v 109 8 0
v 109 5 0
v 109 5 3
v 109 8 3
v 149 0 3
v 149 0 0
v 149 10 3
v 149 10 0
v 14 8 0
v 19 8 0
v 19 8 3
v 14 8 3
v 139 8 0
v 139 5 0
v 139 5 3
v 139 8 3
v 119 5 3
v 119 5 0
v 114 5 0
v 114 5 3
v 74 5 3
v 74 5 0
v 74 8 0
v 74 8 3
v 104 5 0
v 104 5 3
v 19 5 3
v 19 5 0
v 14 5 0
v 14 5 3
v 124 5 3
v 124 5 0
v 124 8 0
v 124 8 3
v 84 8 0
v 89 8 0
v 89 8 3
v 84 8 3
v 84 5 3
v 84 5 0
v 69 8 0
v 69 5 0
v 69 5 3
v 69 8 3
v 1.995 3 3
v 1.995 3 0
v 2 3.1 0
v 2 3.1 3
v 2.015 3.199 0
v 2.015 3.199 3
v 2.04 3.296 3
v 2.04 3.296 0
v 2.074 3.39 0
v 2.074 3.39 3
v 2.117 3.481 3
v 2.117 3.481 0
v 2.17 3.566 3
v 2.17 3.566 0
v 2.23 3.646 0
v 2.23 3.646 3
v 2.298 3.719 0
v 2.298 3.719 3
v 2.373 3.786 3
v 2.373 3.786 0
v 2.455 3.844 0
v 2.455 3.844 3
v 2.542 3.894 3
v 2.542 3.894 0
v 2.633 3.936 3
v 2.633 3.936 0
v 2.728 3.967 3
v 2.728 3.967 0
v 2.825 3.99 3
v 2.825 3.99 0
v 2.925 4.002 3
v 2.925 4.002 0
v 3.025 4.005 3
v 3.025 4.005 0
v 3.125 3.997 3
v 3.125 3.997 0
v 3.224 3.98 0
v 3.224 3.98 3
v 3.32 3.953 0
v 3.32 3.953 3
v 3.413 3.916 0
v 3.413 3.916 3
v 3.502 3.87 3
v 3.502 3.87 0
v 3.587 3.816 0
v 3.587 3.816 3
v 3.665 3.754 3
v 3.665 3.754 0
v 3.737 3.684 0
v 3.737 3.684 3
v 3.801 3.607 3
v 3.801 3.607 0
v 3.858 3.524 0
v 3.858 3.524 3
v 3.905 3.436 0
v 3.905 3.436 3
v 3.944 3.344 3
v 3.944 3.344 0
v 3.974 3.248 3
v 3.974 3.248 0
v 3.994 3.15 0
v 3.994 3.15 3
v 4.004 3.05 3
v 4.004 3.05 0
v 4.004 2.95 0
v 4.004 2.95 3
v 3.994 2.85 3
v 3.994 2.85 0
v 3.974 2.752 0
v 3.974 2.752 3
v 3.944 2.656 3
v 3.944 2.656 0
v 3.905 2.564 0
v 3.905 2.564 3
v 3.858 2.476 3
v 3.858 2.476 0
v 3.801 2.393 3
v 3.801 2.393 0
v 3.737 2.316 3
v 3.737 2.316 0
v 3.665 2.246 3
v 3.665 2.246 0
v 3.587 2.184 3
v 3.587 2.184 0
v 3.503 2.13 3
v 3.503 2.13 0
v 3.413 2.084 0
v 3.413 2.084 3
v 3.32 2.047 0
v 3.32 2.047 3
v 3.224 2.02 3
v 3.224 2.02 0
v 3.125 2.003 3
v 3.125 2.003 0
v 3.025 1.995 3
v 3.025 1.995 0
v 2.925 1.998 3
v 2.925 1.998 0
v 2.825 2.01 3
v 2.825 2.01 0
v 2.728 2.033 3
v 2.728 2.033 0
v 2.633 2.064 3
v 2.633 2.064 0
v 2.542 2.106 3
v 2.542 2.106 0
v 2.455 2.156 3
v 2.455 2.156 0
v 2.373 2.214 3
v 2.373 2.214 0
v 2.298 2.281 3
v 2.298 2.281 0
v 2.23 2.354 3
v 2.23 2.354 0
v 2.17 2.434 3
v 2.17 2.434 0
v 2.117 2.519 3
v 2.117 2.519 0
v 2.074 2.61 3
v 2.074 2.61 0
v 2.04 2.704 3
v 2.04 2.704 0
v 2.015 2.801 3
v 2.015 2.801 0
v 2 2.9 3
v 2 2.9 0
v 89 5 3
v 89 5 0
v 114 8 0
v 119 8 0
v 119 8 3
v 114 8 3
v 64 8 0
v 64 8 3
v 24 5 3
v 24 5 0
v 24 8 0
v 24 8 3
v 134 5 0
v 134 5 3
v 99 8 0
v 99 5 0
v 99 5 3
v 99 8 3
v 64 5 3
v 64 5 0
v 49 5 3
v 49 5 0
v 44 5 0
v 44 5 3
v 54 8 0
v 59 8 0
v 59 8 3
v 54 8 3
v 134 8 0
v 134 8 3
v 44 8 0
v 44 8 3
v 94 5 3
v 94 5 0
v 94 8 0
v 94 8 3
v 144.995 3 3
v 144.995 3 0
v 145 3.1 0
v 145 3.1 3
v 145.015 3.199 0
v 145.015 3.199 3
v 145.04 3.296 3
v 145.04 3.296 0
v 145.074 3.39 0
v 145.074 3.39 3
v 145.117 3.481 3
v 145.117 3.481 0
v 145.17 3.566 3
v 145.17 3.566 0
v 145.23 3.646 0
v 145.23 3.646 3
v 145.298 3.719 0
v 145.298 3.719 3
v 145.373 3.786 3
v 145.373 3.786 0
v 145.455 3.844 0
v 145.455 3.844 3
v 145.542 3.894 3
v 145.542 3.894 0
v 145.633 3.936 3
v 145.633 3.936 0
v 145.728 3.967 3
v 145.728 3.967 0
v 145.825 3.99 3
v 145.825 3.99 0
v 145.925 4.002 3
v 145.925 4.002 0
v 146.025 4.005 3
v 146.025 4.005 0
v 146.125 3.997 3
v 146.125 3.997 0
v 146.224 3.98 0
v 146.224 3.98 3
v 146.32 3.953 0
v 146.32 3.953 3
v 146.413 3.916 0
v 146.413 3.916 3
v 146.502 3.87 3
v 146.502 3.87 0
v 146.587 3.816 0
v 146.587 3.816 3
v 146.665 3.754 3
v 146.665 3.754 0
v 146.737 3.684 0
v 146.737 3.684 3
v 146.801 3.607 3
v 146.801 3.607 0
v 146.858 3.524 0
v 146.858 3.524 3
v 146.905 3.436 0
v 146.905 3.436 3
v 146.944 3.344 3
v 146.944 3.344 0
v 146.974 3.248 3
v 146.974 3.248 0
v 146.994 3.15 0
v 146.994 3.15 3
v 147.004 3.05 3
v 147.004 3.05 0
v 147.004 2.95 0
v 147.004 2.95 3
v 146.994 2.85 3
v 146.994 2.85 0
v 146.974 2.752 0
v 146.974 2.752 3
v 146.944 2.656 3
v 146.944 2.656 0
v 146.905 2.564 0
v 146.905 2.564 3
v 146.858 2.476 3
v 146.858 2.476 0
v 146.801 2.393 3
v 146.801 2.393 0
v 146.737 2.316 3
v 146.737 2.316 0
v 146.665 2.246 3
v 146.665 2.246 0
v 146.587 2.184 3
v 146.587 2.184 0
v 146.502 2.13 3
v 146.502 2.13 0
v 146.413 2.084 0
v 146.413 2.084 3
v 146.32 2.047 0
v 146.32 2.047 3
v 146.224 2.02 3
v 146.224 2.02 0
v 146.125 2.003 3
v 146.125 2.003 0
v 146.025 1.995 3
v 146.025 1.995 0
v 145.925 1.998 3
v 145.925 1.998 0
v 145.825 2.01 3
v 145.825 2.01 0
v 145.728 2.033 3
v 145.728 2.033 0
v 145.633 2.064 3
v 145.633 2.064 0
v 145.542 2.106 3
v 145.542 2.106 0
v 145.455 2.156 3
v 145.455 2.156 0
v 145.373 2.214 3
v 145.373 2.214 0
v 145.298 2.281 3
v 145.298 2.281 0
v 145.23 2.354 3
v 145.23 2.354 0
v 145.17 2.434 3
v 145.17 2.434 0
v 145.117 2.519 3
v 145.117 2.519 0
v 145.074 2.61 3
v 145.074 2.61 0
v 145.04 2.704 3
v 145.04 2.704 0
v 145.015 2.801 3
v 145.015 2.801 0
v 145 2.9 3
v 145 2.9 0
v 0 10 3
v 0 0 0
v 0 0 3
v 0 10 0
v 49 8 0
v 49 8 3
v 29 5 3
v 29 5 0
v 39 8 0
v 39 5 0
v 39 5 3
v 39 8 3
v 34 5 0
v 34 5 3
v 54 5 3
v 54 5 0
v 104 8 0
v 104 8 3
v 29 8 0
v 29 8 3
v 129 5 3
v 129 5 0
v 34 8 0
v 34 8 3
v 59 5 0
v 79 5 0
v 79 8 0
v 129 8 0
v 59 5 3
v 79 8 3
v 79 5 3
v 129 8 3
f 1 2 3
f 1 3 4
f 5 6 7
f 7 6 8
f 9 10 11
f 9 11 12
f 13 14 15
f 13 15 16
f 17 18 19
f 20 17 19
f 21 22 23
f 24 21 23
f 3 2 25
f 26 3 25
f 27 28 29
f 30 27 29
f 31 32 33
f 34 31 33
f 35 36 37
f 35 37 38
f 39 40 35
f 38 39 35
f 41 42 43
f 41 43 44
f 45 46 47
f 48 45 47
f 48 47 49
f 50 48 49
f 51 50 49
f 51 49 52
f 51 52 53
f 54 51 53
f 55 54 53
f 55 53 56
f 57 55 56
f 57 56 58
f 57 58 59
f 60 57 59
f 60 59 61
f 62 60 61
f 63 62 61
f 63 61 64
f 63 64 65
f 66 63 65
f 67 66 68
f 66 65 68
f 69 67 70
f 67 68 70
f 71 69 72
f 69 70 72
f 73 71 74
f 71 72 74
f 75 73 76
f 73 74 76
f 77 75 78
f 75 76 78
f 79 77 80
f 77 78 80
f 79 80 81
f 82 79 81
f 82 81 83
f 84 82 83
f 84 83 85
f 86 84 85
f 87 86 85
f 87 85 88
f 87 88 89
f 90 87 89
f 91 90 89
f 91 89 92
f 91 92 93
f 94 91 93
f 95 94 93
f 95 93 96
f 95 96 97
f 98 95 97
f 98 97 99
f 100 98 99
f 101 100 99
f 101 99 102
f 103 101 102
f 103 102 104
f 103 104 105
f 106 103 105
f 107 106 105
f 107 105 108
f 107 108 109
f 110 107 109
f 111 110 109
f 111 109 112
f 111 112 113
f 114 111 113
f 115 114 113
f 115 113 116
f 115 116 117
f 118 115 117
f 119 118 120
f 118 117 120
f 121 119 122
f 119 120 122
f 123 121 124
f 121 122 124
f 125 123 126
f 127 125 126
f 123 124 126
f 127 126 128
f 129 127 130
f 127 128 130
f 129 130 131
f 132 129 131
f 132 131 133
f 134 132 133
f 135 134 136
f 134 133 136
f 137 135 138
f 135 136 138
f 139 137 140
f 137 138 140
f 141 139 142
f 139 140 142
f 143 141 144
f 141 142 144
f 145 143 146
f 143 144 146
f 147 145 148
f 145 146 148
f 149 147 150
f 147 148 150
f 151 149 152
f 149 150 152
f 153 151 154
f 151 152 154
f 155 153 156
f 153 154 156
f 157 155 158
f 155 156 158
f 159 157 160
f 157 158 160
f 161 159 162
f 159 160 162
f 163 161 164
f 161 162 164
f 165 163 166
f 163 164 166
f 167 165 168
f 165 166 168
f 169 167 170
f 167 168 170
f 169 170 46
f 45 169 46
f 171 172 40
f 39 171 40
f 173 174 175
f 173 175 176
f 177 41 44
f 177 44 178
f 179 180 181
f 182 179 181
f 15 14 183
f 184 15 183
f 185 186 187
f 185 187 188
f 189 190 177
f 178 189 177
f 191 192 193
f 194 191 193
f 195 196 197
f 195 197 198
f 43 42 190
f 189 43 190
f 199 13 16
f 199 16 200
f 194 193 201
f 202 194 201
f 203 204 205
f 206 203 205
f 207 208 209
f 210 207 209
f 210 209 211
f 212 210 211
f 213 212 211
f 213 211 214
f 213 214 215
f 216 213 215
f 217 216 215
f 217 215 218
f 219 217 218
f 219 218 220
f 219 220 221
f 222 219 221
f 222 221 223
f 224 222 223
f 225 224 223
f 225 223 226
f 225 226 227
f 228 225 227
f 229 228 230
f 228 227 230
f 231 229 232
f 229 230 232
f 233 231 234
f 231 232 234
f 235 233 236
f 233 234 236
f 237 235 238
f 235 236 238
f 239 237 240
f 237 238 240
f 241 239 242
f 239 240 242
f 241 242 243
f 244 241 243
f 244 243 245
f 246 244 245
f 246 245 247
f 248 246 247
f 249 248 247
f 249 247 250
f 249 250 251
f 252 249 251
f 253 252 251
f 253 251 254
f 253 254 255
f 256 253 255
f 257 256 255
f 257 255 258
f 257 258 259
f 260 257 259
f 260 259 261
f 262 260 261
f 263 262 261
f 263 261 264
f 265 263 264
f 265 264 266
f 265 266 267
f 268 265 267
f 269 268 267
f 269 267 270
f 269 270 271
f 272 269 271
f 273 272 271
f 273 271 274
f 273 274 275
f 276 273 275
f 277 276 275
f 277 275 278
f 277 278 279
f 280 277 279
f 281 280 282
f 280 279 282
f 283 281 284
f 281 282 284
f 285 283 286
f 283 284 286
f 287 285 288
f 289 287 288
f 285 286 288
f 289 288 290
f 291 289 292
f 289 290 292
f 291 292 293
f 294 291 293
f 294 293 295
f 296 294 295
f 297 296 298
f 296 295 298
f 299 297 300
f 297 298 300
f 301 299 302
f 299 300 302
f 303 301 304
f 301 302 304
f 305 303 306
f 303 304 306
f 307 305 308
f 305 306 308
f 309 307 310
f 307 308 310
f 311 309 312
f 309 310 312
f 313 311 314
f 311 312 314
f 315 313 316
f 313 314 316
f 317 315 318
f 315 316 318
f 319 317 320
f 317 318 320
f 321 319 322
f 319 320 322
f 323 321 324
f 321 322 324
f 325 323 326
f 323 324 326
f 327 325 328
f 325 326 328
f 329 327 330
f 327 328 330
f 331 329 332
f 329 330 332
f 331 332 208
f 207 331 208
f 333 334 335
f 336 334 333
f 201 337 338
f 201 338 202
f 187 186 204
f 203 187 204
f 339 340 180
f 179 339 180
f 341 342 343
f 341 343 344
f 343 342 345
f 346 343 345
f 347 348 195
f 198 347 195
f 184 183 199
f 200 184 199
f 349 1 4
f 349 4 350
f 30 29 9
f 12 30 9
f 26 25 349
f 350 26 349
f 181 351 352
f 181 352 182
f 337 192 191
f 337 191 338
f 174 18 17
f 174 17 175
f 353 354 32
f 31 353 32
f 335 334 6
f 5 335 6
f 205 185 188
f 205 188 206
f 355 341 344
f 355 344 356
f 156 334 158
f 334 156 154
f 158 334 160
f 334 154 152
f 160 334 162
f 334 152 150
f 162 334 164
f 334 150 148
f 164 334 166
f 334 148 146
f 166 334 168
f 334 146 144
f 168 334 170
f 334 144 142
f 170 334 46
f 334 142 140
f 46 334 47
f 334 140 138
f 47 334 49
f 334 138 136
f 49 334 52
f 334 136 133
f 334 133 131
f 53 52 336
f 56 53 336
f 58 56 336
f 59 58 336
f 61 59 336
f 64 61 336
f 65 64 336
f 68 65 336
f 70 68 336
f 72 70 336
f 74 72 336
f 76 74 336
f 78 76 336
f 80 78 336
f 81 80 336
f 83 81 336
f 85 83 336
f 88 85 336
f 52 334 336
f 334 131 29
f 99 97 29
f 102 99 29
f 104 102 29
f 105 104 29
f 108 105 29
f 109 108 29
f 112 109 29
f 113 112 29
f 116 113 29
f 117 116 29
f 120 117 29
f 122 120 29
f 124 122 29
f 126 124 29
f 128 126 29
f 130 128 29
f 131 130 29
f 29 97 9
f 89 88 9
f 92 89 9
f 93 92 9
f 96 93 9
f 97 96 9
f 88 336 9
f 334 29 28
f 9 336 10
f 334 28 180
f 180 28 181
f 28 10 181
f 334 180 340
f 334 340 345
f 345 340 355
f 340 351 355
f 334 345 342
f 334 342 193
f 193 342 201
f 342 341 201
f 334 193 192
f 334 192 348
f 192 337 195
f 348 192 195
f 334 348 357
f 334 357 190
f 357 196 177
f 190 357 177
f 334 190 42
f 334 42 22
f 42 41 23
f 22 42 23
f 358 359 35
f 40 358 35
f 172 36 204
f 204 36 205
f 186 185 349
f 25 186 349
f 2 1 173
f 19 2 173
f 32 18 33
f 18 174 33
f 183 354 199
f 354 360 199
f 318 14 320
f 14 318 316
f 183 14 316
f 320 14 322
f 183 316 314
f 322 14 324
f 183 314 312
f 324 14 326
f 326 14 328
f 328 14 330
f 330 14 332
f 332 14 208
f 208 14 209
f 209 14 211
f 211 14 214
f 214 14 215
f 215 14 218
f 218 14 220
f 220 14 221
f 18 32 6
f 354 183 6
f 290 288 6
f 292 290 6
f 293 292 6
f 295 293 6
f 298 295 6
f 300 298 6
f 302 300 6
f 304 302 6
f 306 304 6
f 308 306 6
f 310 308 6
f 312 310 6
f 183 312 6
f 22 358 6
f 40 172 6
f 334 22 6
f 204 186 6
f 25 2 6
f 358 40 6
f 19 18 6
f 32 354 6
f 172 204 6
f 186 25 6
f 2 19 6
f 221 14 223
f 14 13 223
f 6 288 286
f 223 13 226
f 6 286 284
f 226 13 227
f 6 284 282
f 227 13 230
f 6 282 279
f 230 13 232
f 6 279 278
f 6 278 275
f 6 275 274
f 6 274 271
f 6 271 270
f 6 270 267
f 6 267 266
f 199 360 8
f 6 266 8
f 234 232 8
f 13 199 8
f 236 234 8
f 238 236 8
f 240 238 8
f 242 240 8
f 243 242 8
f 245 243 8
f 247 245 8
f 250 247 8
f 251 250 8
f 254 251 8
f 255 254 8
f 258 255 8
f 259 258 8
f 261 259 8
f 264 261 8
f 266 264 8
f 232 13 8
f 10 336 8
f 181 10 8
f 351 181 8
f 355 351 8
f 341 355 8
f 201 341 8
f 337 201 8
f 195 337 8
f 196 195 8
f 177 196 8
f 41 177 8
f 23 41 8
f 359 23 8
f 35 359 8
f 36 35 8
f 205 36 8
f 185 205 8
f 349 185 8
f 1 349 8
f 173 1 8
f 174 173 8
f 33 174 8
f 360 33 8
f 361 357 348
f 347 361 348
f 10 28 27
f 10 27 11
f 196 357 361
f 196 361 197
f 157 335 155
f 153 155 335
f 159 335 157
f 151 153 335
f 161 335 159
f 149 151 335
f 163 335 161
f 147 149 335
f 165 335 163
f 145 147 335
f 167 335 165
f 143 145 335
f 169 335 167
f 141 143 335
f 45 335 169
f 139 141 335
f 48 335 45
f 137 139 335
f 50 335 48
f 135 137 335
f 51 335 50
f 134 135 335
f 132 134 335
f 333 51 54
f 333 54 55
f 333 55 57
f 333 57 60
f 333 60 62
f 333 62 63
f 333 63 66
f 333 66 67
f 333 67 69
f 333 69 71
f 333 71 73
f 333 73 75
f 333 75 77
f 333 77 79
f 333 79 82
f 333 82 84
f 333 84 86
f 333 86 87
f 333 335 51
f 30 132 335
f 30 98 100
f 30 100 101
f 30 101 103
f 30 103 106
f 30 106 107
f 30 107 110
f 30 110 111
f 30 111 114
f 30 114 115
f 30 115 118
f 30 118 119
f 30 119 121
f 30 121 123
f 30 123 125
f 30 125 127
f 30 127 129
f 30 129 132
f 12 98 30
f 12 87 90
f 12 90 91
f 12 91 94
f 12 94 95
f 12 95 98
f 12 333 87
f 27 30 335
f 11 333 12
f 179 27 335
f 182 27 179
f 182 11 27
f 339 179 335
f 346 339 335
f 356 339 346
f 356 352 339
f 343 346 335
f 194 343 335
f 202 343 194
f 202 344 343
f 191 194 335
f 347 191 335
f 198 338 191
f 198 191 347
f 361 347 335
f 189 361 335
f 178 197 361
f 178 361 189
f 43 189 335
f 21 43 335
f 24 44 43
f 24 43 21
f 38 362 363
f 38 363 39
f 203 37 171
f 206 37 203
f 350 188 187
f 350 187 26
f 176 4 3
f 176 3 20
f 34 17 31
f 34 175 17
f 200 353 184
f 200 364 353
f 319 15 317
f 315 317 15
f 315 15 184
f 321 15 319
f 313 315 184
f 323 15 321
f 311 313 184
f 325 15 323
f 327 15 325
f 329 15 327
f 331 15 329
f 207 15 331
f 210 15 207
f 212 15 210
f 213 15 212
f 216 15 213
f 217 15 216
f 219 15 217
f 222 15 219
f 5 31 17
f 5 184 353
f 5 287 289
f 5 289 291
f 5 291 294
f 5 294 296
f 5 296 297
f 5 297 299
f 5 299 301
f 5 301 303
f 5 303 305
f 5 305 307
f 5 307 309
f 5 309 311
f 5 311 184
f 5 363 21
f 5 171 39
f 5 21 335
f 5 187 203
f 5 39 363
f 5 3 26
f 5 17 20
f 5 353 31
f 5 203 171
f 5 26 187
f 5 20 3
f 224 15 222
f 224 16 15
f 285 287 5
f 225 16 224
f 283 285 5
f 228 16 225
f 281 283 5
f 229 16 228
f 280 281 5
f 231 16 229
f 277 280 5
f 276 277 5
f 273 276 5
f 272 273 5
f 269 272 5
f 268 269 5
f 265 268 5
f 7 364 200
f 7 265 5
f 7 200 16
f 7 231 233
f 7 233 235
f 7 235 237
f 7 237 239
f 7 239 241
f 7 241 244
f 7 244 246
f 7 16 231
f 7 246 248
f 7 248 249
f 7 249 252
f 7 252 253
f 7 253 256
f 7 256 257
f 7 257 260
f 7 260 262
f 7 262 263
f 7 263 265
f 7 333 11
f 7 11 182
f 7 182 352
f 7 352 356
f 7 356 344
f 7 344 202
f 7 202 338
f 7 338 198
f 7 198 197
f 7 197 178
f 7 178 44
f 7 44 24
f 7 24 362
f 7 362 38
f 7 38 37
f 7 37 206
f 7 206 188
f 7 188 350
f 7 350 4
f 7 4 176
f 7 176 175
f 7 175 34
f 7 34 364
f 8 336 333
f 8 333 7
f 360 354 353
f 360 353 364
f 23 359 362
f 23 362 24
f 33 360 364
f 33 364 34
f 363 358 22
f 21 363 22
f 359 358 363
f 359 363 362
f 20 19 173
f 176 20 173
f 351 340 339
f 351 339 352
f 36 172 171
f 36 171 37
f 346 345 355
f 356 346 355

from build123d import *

# Parameters (mm, degrees)
ESQUISSE1_W             = 149
ESQUISSE1_H             = 10
BOSS_EXTRU_1_DEPTH      = 3
ESQUISSE2_R             = 1.005
ESQUISSE2_W             = 5
ESQUISSE2_H             = 3
ENL_V_MAT_EXTRU_1_DEPTH = 150.365323954


with BuildPart() as part:
    # Esquisse1 → Boss.-Extru.1 (new body)
    with BuildSketch(Plane.XY):
        with Locations((74.5, 5)):
            Rectangle(ESQUISSE1_W, ESQUISSE1_H)
    extrude(amount=BOSS_EXTRU_1_DEPTH)

    # Esquisse2 → Enlèv. mat.-Extru.1 (cut, through all)
    with BuildSketch(Plane(origin=(0, 0, 0), x_dir=(-1, 0, 0), z_dir=(0, 0, -1))):
        with Locations((-3, 3)):
            Circle(ESQUISSE2_R)
        with Locations((-146, 3)):
            Circle(ESQUISSE2_R)
        with Locations((-136.5, 6.5)):
            Rectangle(ESQUISSE2_W, ESQUISSE2_H)
        with Locations((-126.5, 6.5)):
            Rectangle(ESQUISSE2_W, ESQUISSE2_H)
        with Locations((-116.5, 6.5)):
            Rectangle(ESQUISSE2_W, ESQUISSE2_H)
        with Locations((-106.5, 6.5)):
            Rectangle(ESQUISSE2_W, ESQUISSE2_H)
        with Locations((-96.5, 6.5)):
            Rectangle(ESQUISSE2_W, ESQUISSE2_H)
        with Locations((-86.5, 6.5)):
            Rectangle(ESQUISSE2_W, ESQUISSE2_H)
        with Locations((-76.5, 6.5)):
            Rectangle(ESQUISSE2_W, ESQUISSE2_H)
        with Locations((-66.5, 6.5)):
            Rectangle(ESQUISSE2_W, ESQUISSE2_H)
        with Locations((-56.5, 6.5)):
            Rectangle(ESQUISSE2_W, ESQUISSE2_H)
        with Locations((-46.5, 6.5)):
            Rectangle(ESQUISSE2_W, ESQUISSE2_H)
        with Locations((-36.5, 6.5)):
            Rectangle(ESQUISSE2_W, ESQUISSE2_H)
        with Locations((-26.5, 6.5)):
            Rectangle(ESQUISSE2_W, ESQUISSE2_H)
        with Locations((-16.5, 6.5)):
            Rectangle(ESQUISSE2_W, ESQUISSE2_H)
    extrude(amount=-ENL_V_MAT_EXTRU_1_DEPTH, mode=Mode.SUBTRACT)


solid = part.part
